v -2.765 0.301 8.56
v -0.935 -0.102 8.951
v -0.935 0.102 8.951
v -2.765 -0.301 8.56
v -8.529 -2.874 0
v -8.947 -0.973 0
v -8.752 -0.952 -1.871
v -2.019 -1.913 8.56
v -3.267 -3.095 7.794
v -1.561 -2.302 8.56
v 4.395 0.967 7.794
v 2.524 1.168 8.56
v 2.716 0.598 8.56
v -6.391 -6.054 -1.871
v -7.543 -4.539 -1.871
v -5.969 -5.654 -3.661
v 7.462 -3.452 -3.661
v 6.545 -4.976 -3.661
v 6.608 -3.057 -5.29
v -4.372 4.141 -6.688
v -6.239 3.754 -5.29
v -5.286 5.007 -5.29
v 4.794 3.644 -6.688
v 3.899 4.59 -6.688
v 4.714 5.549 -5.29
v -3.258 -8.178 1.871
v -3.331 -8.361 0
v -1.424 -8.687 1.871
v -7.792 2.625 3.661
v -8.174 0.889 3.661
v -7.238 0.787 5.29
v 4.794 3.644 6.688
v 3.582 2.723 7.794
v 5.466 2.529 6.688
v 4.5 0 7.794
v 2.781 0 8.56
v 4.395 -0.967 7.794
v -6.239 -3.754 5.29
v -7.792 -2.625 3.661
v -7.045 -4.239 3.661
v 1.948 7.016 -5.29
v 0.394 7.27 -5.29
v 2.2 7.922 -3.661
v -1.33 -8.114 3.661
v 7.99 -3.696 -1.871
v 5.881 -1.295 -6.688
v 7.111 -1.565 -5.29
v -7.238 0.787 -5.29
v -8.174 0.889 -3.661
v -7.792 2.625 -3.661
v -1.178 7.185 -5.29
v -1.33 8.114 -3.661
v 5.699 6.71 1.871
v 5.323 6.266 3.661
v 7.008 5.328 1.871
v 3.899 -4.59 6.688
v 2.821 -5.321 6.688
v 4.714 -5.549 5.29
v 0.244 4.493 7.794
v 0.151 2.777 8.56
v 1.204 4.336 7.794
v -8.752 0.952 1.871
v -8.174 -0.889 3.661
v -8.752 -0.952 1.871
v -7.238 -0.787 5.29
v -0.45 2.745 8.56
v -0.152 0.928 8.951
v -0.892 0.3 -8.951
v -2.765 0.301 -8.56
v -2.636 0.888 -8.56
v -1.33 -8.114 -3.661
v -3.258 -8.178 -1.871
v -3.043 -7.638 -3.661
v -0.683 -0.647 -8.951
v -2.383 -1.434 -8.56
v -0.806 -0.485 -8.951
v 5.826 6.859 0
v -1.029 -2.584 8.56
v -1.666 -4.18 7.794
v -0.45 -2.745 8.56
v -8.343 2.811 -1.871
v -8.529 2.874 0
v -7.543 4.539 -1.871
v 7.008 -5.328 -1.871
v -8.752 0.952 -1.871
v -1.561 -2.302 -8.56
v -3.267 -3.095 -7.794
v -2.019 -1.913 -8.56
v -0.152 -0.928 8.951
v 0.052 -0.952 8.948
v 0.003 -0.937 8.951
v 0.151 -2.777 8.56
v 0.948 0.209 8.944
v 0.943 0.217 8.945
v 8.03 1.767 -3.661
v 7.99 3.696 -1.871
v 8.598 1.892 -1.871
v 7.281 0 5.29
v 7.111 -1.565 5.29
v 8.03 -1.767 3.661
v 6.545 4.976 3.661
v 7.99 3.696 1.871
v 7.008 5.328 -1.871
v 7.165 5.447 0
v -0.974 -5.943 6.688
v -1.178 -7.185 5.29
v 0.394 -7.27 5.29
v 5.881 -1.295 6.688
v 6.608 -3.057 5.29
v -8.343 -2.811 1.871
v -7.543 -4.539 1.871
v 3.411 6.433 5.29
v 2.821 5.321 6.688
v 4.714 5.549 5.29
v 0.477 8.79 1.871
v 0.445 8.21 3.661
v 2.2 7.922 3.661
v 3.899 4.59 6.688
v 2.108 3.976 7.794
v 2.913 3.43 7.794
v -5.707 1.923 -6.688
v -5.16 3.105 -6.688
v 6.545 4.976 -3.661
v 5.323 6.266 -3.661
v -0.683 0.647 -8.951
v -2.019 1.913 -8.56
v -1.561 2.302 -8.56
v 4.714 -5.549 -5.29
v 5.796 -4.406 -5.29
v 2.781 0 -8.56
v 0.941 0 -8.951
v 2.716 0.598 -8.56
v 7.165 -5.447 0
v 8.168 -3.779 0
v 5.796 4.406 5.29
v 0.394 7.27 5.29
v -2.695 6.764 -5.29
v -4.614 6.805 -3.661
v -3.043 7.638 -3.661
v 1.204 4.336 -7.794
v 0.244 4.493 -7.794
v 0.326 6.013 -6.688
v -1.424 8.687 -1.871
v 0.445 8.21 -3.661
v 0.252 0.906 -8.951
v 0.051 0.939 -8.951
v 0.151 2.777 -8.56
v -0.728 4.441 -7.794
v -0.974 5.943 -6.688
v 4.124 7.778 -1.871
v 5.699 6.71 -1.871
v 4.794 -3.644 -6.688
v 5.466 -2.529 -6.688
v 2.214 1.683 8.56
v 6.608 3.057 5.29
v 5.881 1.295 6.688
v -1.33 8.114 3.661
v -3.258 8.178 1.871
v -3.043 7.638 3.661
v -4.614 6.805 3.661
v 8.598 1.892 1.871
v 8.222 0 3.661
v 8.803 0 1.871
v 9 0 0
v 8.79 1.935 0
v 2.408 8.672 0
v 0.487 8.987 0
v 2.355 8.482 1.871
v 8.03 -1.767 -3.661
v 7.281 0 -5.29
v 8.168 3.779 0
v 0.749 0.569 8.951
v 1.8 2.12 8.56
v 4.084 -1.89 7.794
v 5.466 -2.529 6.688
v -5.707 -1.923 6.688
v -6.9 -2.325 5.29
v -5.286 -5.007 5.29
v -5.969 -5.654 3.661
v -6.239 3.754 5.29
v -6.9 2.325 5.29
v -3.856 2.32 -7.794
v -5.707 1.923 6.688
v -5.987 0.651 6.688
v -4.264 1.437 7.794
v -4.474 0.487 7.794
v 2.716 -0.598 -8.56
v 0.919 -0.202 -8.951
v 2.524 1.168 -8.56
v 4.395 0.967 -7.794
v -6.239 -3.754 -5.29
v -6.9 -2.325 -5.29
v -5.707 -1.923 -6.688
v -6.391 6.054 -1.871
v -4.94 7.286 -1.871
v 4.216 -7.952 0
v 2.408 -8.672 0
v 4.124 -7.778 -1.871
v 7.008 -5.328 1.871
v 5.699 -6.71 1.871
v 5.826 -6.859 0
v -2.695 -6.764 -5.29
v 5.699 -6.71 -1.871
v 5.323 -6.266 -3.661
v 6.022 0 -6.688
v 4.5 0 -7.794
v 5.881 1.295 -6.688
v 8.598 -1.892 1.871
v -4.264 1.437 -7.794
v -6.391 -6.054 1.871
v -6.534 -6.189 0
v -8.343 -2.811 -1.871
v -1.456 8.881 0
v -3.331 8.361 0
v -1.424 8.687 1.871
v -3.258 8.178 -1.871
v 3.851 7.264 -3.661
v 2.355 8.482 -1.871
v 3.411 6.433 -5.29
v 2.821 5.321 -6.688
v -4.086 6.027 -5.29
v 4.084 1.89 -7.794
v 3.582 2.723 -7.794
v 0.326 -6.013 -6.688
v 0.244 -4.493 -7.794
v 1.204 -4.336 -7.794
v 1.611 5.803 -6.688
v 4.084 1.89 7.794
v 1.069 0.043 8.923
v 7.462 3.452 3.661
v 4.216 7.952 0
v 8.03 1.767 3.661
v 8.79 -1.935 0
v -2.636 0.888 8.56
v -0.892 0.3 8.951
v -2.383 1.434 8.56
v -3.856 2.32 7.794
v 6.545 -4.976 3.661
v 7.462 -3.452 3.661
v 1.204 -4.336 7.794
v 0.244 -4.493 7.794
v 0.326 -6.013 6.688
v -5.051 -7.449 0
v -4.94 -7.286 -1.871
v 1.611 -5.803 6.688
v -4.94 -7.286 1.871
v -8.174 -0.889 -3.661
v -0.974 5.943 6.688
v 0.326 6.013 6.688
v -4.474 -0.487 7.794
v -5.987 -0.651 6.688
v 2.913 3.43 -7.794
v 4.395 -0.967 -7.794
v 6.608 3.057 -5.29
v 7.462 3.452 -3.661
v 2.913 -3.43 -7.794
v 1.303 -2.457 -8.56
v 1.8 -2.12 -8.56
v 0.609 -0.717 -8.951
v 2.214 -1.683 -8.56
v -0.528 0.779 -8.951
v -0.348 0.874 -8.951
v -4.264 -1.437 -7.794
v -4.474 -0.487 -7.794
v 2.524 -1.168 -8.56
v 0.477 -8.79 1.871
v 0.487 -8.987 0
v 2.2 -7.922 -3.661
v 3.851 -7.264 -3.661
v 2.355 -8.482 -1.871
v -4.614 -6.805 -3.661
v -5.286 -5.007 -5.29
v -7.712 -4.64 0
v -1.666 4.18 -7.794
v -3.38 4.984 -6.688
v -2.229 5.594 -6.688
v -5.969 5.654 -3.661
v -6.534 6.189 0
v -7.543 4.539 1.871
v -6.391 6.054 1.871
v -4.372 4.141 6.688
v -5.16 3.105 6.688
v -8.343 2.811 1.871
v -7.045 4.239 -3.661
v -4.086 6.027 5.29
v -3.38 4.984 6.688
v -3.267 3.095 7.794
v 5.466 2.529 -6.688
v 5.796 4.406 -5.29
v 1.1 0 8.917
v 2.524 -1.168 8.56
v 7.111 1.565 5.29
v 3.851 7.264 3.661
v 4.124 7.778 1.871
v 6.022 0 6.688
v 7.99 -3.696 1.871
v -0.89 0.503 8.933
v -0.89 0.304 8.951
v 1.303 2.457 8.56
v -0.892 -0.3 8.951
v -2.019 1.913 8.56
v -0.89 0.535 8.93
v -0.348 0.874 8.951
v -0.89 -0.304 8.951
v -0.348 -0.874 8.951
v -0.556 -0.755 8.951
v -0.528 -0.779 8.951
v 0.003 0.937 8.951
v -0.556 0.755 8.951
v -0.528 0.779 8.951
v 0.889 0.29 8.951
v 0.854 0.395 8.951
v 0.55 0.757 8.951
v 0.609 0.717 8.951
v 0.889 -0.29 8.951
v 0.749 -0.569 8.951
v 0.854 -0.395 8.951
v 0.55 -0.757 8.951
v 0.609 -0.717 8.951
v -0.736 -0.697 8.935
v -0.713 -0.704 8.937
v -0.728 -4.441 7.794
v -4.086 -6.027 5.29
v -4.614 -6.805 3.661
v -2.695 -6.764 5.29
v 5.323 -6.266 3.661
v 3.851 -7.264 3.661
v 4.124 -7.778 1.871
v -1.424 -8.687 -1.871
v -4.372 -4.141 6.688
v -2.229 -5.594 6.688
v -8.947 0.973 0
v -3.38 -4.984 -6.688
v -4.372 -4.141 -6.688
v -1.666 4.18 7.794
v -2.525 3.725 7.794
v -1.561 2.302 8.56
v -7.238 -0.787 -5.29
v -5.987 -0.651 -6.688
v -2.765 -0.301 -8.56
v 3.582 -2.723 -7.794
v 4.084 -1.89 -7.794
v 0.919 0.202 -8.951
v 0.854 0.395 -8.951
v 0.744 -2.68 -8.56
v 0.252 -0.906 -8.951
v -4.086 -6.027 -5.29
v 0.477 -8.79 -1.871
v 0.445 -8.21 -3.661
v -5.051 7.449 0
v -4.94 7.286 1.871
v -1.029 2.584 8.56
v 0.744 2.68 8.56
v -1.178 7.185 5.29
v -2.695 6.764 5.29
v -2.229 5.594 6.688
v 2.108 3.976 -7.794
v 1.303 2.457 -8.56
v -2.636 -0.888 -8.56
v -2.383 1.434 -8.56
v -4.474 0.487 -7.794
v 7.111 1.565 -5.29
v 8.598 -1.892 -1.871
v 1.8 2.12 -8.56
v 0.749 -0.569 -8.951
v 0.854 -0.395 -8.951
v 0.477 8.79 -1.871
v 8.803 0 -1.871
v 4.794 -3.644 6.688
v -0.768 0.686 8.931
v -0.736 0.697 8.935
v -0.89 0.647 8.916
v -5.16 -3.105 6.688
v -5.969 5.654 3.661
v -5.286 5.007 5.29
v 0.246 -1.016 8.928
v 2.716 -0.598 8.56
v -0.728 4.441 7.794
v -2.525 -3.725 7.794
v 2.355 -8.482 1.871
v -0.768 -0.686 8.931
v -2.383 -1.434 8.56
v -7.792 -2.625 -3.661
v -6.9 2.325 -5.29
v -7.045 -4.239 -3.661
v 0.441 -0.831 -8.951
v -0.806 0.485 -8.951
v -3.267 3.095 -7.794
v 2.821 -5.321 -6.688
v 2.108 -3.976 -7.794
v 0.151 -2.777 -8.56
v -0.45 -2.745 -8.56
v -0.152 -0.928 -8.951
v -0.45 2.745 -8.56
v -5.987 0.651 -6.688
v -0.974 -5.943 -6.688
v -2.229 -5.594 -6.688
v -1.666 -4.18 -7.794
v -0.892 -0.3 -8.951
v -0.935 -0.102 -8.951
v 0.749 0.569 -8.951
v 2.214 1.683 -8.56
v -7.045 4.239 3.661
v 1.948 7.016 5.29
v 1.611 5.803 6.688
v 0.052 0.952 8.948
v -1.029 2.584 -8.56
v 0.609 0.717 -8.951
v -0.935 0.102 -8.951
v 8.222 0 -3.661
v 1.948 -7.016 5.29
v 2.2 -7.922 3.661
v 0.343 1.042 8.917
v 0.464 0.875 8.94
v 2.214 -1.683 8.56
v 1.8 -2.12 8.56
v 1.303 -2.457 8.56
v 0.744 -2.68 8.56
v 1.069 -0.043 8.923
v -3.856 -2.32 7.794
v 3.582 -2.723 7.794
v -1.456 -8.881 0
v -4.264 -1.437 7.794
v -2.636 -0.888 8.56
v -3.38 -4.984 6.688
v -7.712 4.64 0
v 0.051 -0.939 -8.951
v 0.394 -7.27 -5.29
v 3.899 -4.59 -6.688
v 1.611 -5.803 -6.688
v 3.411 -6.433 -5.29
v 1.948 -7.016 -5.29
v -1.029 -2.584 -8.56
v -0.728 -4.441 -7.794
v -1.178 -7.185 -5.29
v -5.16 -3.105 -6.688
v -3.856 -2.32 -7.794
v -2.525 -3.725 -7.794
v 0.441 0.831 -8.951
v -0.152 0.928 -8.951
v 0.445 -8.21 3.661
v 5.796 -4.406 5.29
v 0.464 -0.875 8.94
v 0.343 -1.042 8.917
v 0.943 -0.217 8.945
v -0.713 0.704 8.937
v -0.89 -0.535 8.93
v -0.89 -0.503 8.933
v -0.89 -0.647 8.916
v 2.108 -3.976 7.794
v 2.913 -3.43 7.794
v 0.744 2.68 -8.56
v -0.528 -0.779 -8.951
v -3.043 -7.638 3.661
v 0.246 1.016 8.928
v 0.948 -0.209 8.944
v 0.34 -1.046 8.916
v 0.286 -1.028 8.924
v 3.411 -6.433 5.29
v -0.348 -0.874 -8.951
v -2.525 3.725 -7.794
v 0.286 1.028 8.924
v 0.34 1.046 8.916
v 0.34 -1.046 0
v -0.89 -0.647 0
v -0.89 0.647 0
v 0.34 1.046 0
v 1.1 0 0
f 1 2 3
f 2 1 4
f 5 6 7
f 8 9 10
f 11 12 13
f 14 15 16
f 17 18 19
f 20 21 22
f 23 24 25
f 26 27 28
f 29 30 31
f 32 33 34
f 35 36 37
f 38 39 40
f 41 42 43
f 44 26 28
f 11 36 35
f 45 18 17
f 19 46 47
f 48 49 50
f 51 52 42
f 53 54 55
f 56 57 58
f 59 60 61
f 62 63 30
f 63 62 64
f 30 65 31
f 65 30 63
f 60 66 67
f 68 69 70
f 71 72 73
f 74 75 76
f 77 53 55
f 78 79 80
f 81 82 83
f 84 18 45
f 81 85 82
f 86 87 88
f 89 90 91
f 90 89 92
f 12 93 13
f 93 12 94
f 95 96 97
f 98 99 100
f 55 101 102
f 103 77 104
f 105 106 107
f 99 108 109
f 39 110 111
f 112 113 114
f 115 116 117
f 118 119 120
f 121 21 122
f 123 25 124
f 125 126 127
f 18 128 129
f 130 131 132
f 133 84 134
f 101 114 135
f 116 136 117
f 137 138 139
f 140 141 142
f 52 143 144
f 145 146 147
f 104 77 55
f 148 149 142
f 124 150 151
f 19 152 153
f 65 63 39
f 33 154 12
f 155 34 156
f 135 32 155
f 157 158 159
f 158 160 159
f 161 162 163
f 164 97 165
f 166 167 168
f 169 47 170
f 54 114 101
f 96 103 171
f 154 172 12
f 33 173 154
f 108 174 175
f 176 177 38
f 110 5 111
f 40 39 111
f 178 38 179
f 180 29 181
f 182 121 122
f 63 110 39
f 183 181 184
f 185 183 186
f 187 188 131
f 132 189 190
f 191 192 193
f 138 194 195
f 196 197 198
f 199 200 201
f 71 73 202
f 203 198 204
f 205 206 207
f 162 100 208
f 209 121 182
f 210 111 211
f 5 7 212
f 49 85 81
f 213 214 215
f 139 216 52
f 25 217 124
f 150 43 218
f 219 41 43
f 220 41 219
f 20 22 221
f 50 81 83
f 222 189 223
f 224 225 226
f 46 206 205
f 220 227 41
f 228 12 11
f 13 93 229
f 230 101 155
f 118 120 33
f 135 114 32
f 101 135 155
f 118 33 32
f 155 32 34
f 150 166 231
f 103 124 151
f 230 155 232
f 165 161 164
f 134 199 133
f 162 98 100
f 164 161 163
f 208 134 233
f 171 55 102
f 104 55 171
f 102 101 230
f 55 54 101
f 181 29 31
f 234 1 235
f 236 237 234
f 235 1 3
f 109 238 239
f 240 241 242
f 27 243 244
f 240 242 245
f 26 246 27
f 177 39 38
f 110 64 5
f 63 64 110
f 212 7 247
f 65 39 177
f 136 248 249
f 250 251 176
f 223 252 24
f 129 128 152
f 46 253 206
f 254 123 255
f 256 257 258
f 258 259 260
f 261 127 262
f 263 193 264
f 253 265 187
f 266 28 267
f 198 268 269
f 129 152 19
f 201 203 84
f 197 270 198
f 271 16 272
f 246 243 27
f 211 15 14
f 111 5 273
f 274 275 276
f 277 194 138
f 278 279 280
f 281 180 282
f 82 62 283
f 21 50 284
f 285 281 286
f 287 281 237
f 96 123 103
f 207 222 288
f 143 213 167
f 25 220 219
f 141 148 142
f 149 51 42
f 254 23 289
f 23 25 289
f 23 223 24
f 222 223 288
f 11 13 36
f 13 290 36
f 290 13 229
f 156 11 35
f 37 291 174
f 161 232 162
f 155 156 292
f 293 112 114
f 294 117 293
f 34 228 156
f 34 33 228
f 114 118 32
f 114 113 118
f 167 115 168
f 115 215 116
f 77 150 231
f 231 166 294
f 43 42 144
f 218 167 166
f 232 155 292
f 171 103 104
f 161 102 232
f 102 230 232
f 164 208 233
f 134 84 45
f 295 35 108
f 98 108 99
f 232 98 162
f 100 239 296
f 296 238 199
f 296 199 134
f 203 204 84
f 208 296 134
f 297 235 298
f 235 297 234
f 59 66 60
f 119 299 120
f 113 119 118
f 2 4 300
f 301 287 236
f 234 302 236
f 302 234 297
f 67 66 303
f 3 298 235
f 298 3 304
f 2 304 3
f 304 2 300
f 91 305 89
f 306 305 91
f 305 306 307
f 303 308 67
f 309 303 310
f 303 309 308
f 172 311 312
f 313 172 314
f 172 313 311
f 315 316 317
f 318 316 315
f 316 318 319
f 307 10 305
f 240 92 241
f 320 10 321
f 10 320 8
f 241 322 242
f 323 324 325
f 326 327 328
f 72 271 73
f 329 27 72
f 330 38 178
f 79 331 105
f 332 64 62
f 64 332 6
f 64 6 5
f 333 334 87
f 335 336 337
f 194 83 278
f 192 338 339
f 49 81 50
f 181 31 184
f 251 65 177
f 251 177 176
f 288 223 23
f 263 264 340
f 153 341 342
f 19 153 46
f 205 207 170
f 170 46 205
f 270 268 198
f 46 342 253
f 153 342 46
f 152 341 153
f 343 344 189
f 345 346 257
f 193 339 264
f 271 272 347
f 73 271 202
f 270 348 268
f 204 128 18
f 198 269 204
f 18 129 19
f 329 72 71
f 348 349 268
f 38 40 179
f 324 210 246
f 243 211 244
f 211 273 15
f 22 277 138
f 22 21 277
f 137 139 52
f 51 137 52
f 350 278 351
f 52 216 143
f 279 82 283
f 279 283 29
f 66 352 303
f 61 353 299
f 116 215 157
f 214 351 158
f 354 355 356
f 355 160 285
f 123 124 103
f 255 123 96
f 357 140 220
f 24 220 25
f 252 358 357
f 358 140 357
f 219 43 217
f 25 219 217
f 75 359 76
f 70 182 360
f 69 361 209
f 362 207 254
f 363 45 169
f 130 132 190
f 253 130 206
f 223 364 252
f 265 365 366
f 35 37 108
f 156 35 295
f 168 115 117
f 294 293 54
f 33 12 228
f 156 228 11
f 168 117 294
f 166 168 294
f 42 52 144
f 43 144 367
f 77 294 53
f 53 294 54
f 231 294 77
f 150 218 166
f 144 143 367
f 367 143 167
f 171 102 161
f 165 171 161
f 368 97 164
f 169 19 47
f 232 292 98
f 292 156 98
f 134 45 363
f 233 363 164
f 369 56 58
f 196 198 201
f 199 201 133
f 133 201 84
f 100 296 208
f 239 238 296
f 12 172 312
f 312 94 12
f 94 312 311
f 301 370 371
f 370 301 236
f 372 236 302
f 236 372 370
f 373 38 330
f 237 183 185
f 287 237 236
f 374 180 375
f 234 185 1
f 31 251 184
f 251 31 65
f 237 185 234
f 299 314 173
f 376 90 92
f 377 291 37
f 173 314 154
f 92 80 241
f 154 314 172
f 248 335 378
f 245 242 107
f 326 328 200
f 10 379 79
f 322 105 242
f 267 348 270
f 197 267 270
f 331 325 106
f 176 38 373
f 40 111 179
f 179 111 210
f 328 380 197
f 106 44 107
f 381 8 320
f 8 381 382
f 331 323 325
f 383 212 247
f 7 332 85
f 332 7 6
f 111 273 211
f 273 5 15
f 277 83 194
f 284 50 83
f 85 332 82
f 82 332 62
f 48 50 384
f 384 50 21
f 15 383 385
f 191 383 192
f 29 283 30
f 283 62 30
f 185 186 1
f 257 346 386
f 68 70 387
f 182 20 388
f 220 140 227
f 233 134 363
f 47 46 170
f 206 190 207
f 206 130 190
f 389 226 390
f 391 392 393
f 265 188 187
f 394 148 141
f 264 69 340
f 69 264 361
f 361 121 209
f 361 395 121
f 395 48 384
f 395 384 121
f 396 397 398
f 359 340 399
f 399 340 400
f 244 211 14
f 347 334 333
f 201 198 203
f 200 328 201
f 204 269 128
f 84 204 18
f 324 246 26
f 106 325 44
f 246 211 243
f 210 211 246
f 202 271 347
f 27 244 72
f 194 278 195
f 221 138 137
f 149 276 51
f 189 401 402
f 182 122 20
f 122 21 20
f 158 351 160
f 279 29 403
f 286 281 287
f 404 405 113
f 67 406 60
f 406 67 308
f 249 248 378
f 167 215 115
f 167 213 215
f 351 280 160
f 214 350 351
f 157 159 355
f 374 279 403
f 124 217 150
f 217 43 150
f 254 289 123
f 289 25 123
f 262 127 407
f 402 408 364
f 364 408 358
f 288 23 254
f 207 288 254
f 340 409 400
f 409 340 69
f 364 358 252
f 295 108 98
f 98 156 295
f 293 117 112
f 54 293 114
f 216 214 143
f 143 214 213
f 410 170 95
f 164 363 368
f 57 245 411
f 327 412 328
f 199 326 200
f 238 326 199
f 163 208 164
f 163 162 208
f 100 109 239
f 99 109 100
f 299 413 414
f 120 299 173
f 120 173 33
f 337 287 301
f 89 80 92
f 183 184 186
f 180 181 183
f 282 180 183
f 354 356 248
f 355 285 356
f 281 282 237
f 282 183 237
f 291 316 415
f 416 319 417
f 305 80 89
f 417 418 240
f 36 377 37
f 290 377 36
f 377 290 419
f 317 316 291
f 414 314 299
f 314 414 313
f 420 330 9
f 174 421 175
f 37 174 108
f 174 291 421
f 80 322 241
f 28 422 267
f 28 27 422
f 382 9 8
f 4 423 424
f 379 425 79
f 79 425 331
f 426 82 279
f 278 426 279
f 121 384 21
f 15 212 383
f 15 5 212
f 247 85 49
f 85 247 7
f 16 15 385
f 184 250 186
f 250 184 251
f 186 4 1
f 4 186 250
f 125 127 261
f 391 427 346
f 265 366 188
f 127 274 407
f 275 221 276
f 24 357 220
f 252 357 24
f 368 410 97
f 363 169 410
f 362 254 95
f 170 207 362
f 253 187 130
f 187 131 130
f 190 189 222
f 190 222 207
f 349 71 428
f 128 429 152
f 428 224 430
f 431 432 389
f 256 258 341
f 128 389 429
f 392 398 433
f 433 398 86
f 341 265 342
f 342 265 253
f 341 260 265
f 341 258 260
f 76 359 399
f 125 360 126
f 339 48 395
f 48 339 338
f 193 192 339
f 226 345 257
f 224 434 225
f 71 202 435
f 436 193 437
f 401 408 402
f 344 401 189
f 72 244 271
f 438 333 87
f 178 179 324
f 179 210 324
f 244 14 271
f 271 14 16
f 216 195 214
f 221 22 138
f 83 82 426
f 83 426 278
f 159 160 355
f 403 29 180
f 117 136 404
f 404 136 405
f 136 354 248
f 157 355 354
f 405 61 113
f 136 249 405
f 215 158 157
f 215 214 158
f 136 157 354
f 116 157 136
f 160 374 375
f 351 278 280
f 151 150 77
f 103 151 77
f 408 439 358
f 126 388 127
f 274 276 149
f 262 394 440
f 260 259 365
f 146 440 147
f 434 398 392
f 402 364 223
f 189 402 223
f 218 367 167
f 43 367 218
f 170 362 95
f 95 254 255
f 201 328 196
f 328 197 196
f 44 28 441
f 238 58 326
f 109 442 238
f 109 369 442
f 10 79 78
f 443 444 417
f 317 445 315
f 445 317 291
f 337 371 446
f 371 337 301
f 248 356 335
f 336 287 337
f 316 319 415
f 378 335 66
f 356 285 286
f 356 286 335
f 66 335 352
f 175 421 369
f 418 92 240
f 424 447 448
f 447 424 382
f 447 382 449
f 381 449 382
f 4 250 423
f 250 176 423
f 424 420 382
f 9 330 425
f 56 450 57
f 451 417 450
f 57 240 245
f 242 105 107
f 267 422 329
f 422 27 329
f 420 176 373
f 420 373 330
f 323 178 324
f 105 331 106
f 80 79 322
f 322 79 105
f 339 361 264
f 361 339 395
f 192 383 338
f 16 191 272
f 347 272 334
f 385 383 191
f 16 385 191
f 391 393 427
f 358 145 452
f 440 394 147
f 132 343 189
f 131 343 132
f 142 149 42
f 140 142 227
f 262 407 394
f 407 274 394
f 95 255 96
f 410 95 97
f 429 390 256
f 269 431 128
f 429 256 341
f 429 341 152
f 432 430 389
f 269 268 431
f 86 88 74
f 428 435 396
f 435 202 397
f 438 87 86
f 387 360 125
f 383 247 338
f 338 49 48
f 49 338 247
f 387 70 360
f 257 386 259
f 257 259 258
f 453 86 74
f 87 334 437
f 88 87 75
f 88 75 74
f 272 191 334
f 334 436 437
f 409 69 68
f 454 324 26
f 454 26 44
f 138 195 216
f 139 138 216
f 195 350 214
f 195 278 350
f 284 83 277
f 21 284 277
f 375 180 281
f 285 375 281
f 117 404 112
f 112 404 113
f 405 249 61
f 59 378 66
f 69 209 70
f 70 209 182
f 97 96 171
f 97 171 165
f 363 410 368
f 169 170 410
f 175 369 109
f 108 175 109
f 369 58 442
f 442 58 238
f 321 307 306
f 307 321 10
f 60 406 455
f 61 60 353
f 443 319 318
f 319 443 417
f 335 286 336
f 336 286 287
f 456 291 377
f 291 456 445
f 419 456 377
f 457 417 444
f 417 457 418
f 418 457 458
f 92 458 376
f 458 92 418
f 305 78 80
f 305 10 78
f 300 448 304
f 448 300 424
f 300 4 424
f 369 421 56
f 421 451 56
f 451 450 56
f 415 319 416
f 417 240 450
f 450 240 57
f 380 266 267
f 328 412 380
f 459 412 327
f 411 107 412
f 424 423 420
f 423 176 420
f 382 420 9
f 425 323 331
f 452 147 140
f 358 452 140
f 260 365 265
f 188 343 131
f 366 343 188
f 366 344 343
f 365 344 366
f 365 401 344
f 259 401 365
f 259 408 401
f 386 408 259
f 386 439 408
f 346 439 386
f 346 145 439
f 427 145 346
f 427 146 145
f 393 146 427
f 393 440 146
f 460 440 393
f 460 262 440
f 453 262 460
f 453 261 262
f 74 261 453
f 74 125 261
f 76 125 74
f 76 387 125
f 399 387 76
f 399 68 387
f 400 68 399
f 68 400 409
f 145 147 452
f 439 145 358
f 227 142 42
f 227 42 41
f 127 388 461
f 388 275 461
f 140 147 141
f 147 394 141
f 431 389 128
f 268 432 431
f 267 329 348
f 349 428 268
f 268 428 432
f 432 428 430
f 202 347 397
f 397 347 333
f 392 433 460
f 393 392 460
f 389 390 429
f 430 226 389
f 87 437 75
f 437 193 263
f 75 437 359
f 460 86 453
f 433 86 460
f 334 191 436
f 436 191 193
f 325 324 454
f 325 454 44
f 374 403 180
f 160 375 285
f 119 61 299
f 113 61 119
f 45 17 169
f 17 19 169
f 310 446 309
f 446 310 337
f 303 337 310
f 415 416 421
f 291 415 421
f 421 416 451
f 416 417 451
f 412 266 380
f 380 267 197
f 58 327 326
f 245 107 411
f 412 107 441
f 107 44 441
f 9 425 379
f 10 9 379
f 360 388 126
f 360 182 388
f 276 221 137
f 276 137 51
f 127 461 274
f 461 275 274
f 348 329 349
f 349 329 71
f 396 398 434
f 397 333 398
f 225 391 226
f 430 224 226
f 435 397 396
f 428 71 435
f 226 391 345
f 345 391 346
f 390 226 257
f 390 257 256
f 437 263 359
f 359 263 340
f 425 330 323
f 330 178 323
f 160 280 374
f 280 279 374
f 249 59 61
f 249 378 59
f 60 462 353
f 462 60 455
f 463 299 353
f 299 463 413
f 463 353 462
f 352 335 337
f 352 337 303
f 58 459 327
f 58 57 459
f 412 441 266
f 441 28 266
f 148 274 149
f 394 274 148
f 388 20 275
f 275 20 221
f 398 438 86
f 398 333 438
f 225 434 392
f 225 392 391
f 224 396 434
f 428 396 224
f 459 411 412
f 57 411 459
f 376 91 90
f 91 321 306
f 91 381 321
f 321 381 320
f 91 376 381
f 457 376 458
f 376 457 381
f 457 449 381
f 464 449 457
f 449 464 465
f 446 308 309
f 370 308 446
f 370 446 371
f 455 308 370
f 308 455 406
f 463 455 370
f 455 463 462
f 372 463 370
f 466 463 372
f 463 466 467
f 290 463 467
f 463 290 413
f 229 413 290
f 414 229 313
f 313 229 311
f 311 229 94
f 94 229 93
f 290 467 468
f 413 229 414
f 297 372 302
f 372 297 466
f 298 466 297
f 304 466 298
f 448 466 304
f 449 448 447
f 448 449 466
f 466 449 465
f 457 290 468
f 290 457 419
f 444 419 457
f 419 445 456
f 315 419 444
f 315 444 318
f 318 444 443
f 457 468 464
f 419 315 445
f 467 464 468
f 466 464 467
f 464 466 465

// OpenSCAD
size = 9;
holesize = 1.1;
//eoc

module bead() {
	
	color([0.3,0,0.6]) 
	render(covexity = 1) 
		difference() {
			sphere(size);
			//height, radius, radius, center
			cylinder(size*2.25, r=holesize, true);
		}
}

bead();
